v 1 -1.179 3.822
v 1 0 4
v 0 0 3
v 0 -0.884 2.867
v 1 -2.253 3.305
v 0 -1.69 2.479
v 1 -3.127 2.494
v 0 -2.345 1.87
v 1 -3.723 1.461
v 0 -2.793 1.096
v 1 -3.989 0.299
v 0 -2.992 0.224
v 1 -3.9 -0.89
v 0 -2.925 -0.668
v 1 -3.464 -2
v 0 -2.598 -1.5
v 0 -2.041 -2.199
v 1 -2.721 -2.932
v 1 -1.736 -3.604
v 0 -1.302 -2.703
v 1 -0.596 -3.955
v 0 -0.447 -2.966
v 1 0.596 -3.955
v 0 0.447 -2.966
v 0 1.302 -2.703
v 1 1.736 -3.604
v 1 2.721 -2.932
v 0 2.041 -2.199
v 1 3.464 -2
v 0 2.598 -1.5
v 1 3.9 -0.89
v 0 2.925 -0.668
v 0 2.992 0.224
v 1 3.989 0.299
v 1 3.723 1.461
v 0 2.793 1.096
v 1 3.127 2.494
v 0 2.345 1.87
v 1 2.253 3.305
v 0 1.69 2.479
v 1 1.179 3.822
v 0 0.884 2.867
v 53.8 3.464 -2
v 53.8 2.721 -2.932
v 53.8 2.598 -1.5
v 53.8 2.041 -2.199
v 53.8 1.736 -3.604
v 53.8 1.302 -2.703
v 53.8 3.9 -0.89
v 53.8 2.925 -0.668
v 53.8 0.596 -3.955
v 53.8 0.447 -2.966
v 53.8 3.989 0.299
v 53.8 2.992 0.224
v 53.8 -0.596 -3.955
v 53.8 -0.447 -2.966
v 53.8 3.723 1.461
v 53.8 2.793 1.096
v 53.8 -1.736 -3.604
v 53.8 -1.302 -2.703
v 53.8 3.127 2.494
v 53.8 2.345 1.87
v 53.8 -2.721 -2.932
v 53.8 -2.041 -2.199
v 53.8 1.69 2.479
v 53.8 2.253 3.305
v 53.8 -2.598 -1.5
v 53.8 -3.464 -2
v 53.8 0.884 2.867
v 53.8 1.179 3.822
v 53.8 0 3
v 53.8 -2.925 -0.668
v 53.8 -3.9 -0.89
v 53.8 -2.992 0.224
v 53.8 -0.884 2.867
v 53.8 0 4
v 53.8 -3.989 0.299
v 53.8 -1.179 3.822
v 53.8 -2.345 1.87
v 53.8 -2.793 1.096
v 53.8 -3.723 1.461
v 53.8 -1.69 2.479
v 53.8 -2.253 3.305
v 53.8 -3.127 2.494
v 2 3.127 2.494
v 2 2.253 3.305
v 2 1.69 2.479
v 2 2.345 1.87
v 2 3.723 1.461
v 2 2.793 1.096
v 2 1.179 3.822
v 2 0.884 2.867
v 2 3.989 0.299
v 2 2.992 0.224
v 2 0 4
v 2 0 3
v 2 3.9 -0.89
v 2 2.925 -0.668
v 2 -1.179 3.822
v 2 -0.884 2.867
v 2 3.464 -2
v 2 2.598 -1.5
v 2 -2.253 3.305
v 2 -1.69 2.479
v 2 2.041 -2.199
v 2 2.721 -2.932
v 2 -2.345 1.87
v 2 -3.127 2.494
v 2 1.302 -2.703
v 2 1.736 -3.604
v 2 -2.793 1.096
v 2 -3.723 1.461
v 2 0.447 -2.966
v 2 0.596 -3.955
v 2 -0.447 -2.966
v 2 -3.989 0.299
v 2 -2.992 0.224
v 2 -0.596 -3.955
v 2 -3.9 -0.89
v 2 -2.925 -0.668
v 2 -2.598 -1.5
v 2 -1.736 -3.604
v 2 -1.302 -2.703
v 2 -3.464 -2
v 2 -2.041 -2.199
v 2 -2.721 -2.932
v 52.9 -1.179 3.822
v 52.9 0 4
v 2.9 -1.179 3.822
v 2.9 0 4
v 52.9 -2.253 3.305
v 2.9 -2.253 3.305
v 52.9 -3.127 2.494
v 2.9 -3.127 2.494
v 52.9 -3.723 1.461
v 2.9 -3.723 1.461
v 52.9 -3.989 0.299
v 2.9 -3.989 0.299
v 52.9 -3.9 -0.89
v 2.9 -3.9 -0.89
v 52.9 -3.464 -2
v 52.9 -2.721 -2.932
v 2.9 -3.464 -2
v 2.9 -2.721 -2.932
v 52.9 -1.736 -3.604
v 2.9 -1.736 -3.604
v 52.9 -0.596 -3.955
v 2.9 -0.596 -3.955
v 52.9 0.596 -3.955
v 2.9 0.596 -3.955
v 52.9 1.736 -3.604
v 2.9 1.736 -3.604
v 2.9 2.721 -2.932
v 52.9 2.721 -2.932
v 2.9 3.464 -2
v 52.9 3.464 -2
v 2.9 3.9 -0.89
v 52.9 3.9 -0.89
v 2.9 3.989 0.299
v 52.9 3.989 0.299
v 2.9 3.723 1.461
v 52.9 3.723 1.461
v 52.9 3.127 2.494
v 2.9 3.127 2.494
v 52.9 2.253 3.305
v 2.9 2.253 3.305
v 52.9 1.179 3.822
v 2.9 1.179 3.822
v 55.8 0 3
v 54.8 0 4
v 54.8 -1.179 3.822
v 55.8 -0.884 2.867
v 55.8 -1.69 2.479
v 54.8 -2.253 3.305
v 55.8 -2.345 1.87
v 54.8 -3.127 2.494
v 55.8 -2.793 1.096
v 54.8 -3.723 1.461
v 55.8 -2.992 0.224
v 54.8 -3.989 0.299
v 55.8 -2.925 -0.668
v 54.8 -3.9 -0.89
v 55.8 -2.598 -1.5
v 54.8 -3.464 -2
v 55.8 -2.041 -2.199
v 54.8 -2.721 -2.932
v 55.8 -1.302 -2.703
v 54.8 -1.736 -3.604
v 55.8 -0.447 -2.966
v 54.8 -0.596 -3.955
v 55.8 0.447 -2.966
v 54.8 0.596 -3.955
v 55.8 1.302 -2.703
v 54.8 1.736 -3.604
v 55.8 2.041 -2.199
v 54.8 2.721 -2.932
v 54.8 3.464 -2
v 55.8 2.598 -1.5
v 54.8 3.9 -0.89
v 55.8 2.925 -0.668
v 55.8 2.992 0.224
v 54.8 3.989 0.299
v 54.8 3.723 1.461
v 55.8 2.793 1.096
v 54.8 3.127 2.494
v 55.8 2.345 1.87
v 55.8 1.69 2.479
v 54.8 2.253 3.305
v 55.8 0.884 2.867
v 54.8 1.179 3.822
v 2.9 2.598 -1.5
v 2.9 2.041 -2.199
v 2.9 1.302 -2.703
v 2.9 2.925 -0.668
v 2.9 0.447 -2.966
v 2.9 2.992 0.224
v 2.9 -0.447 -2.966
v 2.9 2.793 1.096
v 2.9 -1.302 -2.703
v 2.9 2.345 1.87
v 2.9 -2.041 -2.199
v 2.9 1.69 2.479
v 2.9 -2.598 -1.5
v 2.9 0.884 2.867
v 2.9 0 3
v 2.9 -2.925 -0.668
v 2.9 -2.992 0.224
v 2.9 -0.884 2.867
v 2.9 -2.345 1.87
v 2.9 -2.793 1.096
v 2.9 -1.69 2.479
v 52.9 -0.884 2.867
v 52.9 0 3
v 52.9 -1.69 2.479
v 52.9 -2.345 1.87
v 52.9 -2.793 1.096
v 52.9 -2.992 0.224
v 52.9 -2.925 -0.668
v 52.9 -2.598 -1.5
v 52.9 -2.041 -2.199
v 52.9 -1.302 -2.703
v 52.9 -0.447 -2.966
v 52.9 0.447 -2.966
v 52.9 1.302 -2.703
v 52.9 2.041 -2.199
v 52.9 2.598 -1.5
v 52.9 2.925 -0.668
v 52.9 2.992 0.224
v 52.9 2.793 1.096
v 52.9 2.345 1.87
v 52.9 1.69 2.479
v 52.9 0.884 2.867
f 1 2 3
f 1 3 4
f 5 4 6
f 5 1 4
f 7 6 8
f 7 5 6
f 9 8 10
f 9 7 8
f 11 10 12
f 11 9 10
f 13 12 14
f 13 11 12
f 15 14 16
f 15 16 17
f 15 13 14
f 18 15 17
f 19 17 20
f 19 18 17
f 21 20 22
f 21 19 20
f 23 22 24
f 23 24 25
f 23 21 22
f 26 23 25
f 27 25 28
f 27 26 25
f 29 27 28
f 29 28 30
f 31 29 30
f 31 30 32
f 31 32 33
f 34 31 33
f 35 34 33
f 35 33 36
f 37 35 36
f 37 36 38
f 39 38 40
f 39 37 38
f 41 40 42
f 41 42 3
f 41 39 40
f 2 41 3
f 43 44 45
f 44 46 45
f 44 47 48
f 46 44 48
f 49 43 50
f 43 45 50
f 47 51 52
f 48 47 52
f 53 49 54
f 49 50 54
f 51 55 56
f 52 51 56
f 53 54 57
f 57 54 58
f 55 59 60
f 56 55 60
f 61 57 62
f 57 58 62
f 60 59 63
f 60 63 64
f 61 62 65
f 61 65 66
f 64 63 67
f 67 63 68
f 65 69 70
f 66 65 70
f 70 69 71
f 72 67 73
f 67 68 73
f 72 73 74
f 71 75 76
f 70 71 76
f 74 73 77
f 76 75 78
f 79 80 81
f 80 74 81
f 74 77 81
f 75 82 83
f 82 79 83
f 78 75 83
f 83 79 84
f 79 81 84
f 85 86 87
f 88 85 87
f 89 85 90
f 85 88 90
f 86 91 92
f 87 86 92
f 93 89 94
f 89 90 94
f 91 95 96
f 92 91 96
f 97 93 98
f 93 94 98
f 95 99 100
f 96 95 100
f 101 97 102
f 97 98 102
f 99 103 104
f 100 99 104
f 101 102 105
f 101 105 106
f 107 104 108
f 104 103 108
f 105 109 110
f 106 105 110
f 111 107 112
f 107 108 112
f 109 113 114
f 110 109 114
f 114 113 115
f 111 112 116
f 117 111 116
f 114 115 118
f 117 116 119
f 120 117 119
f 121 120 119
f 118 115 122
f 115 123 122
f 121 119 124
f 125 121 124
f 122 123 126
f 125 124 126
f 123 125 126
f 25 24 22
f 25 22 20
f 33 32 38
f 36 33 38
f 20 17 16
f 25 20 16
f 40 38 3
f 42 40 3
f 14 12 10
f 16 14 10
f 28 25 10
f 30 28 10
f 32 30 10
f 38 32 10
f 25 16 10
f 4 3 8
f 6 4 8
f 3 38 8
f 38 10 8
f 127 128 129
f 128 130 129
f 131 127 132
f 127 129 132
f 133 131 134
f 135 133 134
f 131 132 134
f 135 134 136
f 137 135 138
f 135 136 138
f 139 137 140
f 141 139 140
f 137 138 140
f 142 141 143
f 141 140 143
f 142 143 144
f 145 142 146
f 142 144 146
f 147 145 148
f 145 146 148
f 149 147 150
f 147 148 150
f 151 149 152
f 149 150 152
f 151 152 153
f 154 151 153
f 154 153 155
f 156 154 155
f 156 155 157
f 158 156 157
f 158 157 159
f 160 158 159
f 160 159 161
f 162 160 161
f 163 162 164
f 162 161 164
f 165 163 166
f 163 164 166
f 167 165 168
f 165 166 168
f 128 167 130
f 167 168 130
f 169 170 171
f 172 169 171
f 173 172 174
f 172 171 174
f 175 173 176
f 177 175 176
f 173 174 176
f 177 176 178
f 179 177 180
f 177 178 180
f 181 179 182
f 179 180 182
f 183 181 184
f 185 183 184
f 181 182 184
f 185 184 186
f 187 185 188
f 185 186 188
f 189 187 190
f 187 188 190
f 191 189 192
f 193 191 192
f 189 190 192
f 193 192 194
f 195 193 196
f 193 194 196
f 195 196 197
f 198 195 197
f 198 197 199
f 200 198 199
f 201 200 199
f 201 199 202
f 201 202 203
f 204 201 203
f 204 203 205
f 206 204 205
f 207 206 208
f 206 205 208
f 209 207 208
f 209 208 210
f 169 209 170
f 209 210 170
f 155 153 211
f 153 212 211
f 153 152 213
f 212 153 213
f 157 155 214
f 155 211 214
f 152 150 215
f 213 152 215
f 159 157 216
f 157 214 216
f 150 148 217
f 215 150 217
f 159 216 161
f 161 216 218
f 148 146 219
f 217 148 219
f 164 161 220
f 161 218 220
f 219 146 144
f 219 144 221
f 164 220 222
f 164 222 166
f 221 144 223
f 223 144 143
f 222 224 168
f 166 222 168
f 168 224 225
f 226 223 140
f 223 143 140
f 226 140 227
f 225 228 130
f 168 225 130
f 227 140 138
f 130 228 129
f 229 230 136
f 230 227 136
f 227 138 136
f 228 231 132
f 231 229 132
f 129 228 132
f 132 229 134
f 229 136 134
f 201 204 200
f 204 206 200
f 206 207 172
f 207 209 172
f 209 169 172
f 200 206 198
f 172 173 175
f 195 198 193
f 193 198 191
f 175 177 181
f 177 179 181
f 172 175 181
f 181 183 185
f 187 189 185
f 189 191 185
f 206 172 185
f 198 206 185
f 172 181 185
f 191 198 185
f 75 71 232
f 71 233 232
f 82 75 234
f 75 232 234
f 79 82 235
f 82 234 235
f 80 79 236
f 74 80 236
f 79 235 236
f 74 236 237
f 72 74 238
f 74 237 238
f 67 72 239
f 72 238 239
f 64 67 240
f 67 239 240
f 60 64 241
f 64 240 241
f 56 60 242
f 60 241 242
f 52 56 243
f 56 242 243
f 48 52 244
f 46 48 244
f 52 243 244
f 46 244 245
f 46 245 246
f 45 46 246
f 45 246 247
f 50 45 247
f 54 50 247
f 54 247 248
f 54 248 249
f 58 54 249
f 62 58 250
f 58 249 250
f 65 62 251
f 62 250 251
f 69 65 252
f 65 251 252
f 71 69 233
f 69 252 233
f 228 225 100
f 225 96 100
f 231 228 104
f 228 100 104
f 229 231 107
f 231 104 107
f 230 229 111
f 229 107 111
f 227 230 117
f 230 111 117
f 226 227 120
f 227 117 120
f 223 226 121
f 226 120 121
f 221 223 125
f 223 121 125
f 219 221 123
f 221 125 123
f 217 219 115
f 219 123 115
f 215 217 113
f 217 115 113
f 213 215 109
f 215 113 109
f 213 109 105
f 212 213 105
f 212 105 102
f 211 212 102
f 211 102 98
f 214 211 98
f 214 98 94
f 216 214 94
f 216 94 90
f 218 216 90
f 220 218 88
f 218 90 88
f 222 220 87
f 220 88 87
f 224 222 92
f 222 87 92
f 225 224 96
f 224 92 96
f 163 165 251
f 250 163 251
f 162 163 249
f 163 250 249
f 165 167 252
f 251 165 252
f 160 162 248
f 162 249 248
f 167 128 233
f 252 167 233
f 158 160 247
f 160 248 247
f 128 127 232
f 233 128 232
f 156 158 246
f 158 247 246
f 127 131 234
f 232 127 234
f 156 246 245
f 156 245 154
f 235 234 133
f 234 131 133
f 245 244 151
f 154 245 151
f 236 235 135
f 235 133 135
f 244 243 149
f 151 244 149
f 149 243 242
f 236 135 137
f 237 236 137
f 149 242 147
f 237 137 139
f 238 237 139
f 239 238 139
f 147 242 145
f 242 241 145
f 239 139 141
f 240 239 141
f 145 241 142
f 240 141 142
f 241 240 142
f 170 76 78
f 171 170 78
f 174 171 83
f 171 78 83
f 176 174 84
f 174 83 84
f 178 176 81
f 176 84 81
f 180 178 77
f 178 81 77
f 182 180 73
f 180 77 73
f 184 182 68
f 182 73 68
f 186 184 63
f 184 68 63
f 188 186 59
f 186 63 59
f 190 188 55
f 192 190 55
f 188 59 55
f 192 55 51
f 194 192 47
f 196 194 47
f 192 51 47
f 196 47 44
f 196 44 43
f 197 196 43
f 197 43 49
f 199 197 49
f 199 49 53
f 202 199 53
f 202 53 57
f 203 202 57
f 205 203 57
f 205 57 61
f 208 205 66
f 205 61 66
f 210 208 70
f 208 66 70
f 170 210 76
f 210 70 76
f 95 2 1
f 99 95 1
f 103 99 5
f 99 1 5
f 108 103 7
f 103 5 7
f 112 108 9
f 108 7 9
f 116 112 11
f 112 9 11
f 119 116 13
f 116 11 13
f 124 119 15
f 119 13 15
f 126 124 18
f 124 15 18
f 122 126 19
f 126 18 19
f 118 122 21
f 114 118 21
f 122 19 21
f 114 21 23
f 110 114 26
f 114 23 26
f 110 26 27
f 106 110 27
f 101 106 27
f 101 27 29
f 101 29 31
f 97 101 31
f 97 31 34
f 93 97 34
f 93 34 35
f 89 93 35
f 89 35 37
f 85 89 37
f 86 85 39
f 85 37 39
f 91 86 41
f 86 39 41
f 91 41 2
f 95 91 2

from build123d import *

# Parameters (mm, degrees)
F2_SIZE = 1


with BuildPart() as f1:
    # F0 (on Front) → F1 (revolve)
    with BuildSketch(Plane.XZ):
        Polygon((0, 4), (0, 0), (55.8, 0), (55.8, 4), (53.8, 4), (53.8, 3), (52.9, 3), (52.9, 4), (2.9, 4), (2.9, 3), (2, 3), (2, 4), align=None)
    revolve(axis=Axis((27.761492, 0, 0), (1, 0, 0)))

    # F2
    f2_edges = [f1.edges().sort_by_distance(p)[0] for p in [
        (55.8, 0, -4),
        (0, 0, -4),
    ]]
    chamfer(f2_edges, length=F2_SIZE)


solid = f1.part
